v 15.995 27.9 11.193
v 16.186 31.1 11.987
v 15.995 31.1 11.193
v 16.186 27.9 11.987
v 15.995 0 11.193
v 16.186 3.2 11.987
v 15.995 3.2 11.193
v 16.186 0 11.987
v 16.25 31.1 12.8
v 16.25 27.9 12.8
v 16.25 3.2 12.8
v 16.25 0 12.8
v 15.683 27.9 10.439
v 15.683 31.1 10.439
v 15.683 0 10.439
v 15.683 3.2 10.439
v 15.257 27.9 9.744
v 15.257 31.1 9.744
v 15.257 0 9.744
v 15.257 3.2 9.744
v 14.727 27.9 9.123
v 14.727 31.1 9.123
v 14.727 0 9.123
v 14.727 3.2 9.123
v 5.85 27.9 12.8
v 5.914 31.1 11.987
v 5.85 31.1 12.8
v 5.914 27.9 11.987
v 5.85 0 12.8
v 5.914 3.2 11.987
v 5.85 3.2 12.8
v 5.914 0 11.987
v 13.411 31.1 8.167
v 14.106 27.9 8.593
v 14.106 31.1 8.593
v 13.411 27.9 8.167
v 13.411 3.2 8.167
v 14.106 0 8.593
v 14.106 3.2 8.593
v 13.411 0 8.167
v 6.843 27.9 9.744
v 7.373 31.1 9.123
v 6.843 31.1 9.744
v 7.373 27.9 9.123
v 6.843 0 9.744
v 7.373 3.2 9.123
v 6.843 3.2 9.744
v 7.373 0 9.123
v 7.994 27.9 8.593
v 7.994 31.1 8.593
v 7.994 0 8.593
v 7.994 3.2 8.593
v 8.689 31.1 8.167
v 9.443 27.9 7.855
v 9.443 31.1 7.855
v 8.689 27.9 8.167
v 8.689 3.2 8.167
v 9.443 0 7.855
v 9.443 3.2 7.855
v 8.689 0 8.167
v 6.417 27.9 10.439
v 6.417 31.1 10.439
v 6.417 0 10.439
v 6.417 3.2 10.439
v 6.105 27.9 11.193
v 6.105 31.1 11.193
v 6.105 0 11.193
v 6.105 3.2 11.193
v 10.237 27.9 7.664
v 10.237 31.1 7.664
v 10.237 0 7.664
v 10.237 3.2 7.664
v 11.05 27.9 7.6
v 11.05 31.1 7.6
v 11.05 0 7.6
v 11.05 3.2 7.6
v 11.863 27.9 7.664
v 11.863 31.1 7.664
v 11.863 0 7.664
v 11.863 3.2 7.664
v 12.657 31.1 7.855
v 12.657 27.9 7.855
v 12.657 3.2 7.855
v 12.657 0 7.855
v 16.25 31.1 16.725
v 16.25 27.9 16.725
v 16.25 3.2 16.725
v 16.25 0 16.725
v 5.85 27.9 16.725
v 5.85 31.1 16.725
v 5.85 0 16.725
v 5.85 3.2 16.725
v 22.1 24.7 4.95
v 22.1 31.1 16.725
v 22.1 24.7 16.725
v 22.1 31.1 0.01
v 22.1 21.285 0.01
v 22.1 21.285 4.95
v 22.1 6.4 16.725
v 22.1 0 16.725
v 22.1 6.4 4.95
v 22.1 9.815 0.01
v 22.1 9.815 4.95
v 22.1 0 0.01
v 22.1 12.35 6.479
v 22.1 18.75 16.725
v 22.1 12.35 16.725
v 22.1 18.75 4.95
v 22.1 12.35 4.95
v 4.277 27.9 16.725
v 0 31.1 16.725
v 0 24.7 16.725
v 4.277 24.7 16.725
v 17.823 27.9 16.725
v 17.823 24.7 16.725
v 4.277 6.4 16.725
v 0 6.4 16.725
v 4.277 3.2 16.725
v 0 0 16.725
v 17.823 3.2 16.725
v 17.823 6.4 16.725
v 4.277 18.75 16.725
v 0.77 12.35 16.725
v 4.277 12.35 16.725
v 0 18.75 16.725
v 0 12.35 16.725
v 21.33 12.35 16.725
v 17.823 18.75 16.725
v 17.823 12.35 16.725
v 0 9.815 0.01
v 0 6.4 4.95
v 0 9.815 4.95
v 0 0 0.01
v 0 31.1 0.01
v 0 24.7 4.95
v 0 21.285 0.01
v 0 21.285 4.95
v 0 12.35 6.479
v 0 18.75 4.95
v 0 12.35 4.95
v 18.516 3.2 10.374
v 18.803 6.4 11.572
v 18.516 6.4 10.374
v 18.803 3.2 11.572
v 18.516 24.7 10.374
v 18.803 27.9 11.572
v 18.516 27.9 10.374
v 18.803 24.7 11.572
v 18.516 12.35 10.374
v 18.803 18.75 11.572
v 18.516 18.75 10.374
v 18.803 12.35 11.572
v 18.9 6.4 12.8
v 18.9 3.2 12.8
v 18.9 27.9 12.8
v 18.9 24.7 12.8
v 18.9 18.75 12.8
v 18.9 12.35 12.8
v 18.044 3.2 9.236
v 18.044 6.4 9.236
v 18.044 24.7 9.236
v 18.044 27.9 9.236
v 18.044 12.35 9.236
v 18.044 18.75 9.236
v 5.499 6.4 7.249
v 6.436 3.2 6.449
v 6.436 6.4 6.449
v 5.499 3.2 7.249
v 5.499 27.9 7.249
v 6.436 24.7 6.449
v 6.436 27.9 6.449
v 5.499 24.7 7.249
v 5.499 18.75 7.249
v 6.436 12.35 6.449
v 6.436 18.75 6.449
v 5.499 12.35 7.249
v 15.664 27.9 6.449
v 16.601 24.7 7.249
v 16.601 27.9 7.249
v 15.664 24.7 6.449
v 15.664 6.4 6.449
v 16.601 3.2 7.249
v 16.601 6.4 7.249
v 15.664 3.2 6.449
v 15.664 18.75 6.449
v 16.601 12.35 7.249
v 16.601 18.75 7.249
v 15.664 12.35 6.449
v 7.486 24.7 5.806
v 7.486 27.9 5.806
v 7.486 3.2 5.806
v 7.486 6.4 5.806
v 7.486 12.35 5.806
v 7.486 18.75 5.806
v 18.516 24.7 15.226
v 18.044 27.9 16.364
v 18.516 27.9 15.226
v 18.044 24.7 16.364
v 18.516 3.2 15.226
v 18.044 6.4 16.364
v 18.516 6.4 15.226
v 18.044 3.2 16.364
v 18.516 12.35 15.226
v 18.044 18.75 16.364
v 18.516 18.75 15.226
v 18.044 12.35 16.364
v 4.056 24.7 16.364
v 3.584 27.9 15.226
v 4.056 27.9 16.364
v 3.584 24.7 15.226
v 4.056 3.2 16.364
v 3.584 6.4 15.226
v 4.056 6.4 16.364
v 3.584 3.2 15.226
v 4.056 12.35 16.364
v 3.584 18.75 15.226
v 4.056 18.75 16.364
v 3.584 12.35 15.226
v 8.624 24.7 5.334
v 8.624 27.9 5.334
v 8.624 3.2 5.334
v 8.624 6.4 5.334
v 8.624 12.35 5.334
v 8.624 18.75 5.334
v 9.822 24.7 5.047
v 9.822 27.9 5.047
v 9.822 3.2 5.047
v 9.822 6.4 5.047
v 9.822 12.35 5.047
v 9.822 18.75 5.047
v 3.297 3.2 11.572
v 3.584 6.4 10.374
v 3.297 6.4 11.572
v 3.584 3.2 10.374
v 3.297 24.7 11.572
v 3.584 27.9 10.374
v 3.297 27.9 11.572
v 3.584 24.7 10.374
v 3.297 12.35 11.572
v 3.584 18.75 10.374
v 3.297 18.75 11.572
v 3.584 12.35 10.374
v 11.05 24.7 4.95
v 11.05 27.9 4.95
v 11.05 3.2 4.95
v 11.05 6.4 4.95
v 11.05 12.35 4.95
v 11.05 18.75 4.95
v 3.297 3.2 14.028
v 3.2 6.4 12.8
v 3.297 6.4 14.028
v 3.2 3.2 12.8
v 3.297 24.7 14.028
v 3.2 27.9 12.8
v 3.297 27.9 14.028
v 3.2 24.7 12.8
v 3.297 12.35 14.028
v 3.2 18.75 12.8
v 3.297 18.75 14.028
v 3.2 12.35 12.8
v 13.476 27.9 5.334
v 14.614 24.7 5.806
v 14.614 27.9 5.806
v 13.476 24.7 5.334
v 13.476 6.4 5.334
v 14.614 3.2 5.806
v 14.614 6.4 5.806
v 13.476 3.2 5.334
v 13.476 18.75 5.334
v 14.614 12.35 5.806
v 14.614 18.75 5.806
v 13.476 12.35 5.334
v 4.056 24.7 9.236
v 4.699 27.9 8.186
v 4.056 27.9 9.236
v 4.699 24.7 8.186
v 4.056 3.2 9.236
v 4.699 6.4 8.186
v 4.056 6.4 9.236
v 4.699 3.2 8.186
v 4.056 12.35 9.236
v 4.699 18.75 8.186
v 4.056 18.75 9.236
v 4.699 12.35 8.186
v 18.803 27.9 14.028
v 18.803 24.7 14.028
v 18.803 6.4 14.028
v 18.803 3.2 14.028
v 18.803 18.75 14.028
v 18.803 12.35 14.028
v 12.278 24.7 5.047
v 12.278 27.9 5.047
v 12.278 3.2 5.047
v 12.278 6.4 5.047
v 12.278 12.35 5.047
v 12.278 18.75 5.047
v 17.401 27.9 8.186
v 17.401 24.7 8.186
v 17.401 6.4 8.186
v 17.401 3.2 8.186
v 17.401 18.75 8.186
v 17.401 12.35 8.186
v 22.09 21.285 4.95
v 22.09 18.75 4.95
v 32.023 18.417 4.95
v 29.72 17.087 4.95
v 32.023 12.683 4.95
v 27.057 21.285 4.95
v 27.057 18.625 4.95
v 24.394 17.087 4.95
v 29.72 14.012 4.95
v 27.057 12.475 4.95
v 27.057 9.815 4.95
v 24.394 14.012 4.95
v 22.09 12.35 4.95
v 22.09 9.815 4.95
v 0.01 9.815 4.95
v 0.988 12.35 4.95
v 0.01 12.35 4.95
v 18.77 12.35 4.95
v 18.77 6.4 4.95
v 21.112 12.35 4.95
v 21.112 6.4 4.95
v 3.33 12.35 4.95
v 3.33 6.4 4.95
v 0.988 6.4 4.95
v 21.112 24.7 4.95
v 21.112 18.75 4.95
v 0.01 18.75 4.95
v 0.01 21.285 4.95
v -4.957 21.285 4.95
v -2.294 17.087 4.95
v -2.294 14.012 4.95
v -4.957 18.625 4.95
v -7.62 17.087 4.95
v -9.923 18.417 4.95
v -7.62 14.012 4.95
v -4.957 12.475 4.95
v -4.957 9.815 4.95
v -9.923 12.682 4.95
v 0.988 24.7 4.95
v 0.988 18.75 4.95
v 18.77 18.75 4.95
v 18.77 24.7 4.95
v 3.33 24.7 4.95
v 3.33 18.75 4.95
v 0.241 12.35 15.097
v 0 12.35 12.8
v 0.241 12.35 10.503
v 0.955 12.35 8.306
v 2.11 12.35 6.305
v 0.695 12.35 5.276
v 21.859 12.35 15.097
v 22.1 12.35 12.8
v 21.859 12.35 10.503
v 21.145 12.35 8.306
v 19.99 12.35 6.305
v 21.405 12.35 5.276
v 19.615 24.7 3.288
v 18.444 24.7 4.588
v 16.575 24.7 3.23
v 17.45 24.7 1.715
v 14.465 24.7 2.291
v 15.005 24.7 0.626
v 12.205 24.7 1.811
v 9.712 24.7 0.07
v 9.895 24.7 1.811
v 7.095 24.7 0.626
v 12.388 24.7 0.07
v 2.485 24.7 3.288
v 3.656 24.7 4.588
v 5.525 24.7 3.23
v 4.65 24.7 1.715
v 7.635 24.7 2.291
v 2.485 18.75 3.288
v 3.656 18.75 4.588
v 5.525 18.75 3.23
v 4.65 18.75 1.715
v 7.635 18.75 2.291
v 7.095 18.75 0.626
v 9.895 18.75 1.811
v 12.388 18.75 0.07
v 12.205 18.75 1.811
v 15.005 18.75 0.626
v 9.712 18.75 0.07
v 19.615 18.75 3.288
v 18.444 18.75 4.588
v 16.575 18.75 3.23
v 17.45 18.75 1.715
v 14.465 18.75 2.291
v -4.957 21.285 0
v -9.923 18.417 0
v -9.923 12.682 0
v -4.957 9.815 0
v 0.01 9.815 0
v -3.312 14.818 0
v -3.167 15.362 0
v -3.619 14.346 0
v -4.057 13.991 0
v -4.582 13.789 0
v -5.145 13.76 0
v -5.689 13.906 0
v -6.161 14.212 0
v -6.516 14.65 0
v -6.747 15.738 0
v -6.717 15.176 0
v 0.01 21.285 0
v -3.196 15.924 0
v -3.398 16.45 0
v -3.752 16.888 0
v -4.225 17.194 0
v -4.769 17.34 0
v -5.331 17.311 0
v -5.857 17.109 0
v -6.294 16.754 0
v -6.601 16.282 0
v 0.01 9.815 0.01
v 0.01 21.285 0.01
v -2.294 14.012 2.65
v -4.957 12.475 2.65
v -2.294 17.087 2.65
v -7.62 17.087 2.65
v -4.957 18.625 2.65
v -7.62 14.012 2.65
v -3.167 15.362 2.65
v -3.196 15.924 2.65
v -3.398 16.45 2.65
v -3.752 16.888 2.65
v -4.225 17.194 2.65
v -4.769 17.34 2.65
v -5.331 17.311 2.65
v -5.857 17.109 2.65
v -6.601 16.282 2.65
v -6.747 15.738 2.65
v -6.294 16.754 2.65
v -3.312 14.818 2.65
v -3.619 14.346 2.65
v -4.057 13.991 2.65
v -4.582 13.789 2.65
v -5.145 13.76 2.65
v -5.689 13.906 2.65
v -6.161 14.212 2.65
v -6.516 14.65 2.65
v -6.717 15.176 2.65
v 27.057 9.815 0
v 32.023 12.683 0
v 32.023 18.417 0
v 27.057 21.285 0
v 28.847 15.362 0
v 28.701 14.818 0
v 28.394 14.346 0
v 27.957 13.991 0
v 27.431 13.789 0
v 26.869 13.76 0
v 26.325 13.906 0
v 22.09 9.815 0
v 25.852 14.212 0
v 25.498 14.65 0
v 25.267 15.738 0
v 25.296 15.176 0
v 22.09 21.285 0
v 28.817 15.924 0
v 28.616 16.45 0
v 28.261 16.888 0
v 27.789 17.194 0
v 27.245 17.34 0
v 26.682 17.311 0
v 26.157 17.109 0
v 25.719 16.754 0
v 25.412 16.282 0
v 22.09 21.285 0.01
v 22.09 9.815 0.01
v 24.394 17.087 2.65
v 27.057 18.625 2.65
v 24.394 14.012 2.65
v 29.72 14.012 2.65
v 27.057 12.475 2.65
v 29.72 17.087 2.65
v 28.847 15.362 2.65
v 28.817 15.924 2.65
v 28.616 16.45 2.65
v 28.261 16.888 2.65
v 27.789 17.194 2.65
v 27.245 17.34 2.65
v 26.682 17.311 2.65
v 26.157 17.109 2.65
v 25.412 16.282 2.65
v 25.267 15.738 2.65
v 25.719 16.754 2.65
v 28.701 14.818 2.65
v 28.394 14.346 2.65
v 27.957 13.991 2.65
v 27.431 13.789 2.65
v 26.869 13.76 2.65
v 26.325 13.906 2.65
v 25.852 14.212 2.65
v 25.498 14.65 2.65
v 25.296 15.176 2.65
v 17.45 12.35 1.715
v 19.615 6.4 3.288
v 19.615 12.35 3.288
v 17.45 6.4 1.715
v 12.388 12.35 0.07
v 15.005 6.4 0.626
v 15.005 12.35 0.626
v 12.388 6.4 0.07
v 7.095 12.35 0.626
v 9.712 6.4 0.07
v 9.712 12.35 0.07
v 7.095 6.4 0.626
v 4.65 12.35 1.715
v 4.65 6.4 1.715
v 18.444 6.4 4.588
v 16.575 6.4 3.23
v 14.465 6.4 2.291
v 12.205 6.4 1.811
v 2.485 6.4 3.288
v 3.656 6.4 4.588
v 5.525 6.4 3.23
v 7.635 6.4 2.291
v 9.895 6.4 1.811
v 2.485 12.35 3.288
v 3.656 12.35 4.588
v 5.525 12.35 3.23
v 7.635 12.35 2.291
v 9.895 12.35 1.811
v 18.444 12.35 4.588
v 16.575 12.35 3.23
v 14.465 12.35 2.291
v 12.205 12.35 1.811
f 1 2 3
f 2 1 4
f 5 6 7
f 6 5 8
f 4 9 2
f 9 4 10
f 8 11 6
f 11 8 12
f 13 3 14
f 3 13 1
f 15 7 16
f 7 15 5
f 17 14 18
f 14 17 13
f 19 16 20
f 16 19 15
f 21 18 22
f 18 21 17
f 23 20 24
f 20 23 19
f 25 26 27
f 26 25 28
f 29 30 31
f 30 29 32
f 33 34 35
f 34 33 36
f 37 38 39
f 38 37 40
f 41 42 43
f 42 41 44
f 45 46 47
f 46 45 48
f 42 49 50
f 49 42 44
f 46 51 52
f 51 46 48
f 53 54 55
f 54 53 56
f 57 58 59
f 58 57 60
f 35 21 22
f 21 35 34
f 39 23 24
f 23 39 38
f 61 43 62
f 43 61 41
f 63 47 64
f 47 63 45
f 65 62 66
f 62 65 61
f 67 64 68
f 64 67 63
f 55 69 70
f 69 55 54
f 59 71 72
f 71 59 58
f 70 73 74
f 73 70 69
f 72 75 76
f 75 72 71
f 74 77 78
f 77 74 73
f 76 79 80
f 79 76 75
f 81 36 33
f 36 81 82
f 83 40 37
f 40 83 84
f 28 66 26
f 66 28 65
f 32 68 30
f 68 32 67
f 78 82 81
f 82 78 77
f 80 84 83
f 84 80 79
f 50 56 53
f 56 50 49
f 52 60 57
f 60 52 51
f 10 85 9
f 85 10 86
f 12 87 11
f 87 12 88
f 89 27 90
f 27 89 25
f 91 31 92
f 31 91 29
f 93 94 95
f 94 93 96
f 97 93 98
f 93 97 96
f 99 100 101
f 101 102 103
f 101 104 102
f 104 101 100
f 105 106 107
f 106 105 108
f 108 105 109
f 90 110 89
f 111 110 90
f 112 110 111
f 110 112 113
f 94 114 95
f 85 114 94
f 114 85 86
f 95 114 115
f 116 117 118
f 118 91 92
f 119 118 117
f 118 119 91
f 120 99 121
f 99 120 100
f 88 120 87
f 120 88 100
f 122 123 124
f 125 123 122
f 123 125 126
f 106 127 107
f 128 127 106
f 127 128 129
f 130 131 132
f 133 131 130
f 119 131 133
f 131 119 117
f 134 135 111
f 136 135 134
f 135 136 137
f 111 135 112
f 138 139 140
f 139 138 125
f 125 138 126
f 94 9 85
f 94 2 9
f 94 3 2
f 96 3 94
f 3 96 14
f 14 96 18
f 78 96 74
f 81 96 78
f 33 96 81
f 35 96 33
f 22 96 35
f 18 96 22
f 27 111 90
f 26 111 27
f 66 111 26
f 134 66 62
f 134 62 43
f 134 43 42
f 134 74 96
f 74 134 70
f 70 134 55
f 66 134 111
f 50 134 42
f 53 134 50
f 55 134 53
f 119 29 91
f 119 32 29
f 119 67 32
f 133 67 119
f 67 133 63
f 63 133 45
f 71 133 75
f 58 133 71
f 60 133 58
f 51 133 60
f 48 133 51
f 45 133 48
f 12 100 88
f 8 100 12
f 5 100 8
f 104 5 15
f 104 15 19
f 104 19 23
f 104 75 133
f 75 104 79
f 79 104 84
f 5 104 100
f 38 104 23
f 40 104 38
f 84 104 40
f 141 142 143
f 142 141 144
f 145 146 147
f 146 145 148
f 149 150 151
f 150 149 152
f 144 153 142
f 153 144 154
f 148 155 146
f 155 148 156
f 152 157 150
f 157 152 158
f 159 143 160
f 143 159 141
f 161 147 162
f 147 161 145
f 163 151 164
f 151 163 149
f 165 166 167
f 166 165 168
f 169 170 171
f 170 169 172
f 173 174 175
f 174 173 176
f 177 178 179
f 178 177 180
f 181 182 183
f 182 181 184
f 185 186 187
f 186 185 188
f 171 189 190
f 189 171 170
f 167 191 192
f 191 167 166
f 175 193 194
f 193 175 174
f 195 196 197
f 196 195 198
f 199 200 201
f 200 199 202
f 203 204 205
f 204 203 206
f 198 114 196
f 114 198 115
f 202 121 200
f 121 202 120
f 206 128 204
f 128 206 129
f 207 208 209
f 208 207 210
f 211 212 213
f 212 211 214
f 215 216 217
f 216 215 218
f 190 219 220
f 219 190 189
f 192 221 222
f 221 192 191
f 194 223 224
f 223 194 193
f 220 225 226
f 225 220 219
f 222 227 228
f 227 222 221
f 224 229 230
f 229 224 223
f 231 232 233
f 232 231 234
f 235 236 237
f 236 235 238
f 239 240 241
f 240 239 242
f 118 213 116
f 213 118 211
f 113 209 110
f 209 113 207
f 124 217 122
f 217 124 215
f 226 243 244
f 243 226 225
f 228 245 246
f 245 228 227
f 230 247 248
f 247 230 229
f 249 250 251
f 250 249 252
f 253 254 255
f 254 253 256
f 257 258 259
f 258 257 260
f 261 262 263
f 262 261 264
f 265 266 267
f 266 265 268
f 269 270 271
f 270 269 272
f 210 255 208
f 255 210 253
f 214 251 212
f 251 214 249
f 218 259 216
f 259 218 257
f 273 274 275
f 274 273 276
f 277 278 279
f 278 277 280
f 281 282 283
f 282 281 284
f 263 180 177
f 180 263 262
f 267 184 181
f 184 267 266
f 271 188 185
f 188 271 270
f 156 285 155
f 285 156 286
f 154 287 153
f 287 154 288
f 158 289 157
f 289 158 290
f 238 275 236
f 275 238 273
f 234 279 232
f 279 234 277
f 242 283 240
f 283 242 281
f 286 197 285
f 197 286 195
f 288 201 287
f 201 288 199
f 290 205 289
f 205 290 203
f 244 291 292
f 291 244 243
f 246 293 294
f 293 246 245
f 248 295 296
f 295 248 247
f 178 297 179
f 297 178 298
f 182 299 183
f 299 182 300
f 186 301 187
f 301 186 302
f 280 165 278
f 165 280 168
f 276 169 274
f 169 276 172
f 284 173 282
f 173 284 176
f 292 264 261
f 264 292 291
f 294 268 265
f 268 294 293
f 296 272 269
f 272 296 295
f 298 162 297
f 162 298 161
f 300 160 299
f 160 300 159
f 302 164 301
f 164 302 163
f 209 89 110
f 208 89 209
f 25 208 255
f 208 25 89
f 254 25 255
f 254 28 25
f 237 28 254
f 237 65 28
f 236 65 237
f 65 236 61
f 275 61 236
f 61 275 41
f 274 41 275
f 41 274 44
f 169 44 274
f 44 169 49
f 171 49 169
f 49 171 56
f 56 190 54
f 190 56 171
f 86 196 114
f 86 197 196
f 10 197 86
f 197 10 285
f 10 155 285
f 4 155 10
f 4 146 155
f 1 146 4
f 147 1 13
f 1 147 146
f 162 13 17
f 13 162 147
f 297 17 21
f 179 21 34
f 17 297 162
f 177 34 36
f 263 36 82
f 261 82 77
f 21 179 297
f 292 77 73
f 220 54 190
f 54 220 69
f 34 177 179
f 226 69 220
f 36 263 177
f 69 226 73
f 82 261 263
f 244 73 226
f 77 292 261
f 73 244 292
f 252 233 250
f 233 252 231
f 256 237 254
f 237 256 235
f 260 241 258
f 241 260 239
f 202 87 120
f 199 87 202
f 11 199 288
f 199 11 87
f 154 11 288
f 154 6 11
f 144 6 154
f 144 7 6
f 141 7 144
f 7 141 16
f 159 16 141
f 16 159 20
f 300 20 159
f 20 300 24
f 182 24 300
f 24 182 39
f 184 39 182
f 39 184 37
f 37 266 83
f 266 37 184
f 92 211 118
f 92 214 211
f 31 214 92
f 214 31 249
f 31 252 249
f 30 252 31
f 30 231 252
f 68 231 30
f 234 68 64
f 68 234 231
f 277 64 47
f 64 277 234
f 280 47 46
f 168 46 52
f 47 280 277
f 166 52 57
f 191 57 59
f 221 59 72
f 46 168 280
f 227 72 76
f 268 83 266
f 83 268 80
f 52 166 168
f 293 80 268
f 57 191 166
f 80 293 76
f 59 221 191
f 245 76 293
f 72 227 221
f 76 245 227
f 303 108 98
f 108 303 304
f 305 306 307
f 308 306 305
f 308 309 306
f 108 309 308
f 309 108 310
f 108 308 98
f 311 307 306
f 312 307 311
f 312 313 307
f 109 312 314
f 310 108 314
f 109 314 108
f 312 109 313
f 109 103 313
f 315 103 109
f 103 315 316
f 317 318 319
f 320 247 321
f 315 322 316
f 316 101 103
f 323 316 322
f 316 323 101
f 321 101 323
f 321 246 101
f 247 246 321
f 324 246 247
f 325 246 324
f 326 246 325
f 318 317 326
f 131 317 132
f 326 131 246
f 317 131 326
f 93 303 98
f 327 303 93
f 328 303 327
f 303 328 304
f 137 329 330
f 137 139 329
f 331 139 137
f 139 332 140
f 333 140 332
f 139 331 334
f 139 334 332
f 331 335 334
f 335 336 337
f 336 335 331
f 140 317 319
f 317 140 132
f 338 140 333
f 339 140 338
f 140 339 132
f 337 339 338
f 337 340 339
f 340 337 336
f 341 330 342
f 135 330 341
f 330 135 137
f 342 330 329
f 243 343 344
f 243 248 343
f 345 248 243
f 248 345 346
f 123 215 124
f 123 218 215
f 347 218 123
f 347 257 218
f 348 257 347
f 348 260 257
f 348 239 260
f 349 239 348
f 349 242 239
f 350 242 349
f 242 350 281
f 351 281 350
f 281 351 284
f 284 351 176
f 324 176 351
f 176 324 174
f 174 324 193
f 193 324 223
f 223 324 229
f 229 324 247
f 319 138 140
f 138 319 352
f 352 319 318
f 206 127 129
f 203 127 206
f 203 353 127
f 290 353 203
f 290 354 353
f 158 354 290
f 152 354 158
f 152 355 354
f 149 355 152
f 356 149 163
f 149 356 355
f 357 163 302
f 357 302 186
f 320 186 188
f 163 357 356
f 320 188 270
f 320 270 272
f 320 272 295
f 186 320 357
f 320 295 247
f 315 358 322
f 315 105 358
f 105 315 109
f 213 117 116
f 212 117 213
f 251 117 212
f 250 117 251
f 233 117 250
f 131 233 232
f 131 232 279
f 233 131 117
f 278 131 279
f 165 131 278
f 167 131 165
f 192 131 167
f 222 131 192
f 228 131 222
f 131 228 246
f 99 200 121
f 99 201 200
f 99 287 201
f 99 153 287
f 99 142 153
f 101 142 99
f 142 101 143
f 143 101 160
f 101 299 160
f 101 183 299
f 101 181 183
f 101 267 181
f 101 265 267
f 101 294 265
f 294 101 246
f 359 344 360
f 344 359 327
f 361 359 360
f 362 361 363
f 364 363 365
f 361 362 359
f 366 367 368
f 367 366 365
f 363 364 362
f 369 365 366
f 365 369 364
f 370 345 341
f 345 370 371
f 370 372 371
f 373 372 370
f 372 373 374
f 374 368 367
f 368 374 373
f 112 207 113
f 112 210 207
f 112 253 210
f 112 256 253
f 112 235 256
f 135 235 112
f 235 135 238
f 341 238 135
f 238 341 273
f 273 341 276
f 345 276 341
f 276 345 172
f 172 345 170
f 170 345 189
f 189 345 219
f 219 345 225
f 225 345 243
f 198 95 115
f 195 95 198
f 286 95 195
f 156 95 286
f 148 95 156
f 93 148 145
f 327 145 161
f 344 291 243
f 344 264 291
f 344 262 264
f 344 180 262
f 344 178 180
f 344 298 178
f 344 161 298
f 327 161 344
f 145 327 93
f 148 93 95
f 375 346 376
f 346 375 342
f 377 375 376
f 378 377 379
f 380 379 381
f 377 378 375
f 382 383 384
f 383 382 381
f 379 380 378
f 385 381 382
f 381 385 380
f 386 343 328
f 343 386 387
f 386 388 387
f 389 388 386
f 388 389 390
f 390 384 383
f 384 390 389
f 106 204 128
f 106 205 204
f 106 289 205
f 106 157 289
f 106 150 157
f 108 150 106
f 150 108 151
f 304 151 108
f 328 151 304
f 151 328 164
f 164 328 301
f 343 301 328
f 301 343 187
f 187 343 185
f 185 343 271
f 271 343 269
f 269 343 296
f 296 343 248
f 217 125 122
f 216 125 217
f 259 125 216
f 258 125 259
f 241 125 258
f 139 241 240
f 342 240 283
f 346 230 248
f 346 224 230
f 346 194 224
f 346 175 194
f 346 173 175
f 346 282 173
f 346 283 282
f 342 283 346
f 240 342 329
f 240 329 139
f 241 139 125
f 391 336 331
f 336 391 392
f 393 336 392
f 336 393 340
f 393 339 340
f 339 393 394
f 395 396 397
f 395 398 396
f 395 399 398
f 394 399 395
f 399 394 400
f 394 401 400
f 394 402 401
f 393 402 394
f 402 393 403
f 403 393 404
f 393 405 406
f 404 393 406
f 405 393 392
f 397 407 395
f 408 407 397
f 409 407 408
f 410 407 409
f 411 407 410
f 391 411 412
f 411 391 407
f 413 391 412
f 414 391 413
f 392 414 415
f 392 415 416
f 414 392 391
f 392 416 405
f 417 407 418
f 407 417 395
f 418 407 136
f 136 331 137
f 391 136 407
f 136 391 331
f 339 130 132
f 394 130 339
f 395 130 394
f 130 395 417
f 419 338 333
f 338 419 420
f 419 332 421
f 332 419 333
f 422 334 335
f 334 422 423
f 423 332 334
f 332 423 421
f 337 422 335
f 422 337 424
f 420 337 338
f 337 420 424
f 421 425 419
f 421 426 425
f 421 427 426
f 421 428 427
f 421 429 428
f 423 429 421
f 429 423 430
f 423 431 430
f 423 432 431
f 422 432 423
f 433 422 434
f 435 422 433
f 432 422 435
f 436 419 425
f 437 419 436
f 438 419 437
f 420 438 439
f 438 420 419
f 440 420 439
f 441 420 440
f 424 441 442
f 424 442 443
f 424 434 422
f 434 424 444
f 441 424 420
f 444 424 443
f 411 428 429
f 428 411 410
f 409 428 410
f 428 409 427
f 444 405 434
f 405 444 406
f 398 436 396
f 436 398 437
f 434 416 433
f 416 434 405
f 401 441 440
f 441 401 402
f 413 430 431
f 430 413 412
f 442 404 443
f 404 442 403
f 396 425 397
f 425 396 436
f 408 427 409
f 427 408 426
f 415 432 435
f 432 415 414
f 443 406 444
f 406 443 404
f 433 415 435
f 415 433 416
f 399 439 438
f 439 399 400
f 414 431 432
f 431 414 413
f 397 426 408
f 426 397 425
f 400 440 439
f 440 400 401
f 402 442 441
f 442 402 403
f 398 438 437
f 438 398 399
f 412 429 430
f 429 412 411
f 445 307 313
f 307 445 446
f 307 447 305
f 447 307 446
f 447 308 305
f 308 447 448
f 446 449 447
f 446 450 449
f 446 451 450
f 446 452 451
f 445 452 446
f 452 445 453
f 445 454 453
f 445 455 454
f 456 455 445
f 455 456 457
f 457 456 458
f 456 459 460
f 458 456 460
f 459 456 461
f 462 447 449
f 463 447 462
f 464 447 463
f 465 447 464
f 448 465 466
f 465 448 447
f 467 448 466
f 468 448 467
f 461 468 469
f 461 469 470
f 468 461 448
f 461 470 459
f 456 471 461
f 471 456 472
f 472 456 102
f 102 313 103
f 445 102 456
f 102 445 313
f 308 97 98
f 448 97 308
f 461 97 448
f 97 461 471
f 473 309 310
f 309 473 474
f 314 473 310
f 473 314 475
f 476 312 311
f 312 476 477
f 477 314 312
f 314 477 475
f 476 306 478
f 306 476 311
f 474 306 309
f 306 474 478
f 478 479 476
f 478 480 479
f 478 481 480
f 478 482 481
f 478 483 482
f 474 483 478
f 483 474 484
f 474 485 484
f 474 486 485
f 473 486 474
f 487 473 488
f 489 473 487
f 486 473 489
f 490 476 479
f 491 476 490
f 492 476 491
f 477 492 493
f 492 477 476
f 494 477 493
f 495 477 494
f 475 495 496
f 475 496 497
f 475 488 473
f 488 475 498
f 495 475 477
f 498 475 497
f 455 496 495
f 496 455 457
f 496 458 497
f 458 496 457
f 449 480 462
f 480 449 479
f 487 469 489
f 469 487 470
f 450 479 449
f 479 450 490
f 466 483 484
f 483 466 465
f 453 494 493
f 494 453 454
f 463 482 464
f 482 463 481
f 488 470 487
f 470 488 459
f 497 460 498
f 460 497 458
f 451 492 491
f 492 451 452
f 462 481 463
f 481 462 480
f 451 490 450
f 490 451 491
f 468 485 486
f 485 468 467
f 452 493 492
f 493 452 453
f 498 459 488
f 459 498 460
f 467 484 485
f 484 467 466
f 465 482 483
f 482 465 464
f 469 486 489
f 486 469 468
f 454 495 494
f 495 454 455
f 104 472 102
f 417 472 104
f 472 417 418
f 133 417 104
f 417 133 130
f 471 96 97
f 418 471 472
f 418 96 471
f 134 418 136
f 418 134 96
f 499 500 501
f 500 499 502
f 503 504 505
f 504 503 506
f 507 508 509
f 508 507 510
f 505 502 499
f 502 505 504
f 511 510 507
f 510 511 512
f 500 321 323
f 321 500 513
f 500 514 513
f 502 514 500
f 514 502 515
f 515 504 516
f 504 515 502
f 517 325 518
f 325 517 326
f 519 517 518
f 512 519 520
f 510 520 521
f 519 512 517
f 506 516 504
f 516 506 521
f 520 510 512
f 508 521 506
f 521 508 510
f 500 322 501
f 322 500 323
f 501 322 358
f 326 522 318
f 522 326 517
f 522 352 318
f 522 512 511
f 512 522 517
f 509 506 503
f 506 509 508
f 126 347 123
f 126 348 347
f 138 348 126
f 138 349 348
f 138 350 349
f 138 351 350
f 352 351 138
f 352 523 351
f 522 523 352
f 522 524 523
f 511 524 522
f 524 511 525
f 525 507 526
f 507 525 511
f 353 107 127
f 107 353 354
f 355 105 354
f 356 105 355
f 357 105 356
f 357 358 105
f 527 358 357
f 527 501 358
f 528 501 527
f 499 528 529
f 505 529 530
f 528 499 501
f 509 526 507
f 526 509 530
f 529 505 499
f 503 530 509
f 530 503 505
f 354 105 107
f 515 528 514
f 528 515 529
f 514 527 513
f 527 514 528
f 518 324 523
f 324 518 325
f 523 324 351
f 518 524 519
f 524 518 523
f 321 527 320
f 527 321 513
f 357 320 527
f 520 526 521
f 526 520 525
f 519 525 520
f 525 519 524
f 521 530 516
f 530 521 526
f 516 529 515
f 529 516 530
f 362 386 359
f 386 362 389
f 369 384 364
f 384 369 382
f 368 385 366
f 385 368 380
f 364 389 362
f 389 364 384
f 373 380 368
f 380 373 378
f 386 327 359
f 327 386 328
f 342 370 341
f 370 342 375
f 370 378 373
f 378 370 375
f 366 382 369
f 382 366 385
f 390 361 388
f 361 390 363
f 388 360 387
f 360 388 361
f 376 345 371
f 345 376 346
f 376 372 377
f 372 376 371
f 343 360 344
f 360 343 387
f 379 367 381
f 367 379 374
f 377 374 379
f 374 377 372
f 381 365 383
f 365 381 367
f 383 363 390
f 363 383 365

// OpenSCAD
// file: functions.scad
// PRUSA Mendel  
// Functions used in many files
// GNU GPL v2
// Josef Průša
// josefprusa@me.com
// prusadjs.cz
// http://www.reprap.org/wiki/Prusa_Mendel
// http://github.com/prusajr/PrusaMendel

module nut(d,h,horizontal=true){
cornerdiameter =  (d / 2) / cos (180 / 6);
cylinder(h = h, r = cornerdiameter, $fn = 6);
if(horizontal){
for(i = [1:6]){
	rotate([0,0,60*i]) translate([-cornerdiameter-0.2,0,0]) rotate([0,0,-45]) cube(size = [2,2,h]);
}}
}

// By nophead
module polyhole(d,h) {
    n = max(round(2 * d),3);
    rotate([0,0,180])
        cylinder(h = h, r = (d / 2) / cos (180 / n), $fn = n);
}




module roundcorner(diameter){
	difference(){
		cube(size = [diameter,diameter,99], center = false);
		translate(v = [diameter, diameter, 0]) cylinder(h = 100, r=diameter, center=true);
	}
}
// file: metric.scad
// PRUSA Mendel  
// Default metric sizes
// GNU GPL v2
// Josef Průša
// josefprusa@me.com
// prusadjs.cz
// http://www.reprap.org/wiki/Prusa_Mendel
// http://github.com/prusajr/PrusaMendel

// DONT CHANGE THIS FILE! ALTER VALUES IN CONFIGURATION.SCAD INSTEAD

// RODS

threaded_rod_diameter = 8.2;
threaded_rod_diameter_horizontal = 8.2;
smooth_bar_diameter = 8;
smooth_bar_diameter_horizontal = 8.5;

// Nuts and bolts

m8_diameter = 8.9;
m8_nut_diameter = 15.1;

m4_diameter = 4.5;
m4_nut_diameter = 9;

m3_diameter = 3.6;
m3_nut_diameter = 6.15;
m3_nut_heigth = 2.3;
m3_nut_wallDist = cos(30)*m3_nut_diameter;
m3_nut_diameter_horizontal = 6.1;

// Bushing holder

bushing_core_diameter = smooth_bar_diameter;
bushing_material_thickness = 1;

// Motors

motor_shaft = 5.5;
// file: configuration.scad
// PRUSA Mendel  
// Configuration file
// GNU GPL v2
// Josef Průša
// josefprusa@me.com
// prusadjs.cz
// http://www.reprap.org/wiki/Prusa_Mendel
// http://github.com/prusajr/PrusaMendel

// PLEASE SELECT ONE OF THE CONFIGURATIONS BELOW
// BY UN-COMMENTING IT

// Uncomment for metric settings
// METRIC METRIC METRIC METRIC METRIC METRIC METRIC METRIC 

include <metric.scad>;

// Uncomment for imperial settings
// IMPERIAL IMPERIAL IMPERIAL IMPERIAL IMPERIAL IMPERIAL IMPERIAL 

//include <sae.scad>;

// CUSTOM CUSTOM CUSTOM CUSTOM CUSTOM CUSTOM CUSTOM CUSTOM CUSTOM

thin_wall = 3;

// LM8UU
linear = false;


// CHANGE ONLY THE STUFF YOU KNOW
// IT WILL REPLACE DEFAULT SETTING

// RODS

// threaded_rod_diameter = 0;
// threaded_rod_diameter_horizontal = 0;
// smooth_bar_díameter = 0;
// smooth_bar_díameter_horizontal = 0;

// Nuts and bolts

// m8_diameter = 0;
// m8_nut_diameter = 0;

// m4_diameter = 0;
// m4_nut_diameter = 0;

// m3_diameter = 0;
// m3_nut_diameter = 0;

// Bushing holder

// bushing_core_diameter = smooth_bar_díameter;
// bushing_material_thickness = 0;


///counted stuff
m3_nut_diameter_bigger = ((m3_nut_diameter  / 2) / cos (180 / 6))*2;

// functions 
include <functions.scad>
// file: gregs-lm8uu-holder.scad
// Gregs PRUSA Mendel  
// X-carriage
// Used for sliding on X axis
// GNU GPL v2
// Greg Frost
//https://github.com/GregFrost/PrusaMendel

include <configuration.scad>

clearance=0.7;

lm8uu_diameter=15+clearance;
lm8uu_length=24+clearance;
lm8uu_support_thickness=3.2; 
lm8uu_end_diameter=m8_diameter+1.5;

lm8uu_holder_width=lm8uu_diameter+2*lm8uu_support_thickness;
lm8uu_holder_length=lm8uu_length+2*lm8uu_support_thickness;
lm8uu_holder_height=lm8uu_diameter*0.75+lm8uu_support_thickness;
lm8uu_holder_gap=(lm8uu_holder_length-6*lm8uu_support_thickness)/2;

module lm8uu_bearing_holder()
{
	difference()
	{
		cube([lm8uu_holder_width,lm8uu_holder_length,lm8uu_holder_height]);
		translate([lm8uu_holder_width/2,0,lm8uu_holder_width/2])
		rotate([-90,0,0])
		translate([0,0,lm8uu_support_thickness])
		cylinder(r=lm8uu_diameter/2,h=lm8uu_length,$fn=40);

		translate([lm8uu_holder_width/2,0,lm8uu_holder_width/2])
		rotate([-90,0,0])
		translate([0,0,-1])
		{
			cylinder(r=lm8uu_end_diameter/2,h=lm8uu_holder_length+2,$fn=40);
			translate([-lm8uu_end_diameter/2,-lm8uu_end_diameter,0])
			cube([lm8uu_end_diameter,lm8uu_end_diameter,lm8uu_holder_length+2]);
		}

		translate([-1,2*lm8uu_support_thickness,lm8uu_support_thickness])
		cube([lm8uu_holder_width+2,lm8uu_holder_gap,
			lm8uu_holder_height-lm8uu_support_thickness+1]);

		translate([-1,4*lm8uu_support_thickness+lm8uu_holder_gap,
			lm8uu_support_thickness])
		cube([lm8uu_holder_width+2,lm8uu_holder_gap,
			lm8uu_holder_height-lm8uu_support_thickness+1]);
	}
}
// main file
// Gregs PRUSA Mendel  
// X-carriage
// Used for sliding on X axis
// GNU GPL v2
// Greg Frost
//https://github.com/GregFrost/PrusaMendel

include <gregs-lm8uu-holder.scad>
include <configuration.scad>

OS = 0.01;

cabelTie_height = 1.75;
minDist = 0.5;
genWallThicknes = 1.33;

//m3_nut_diameter

y_axis_holder ();

// ring with inner radius r and w as witth and h as heigt
module ring(r,w,h,center=false){
	difference() {
		union () {
			cylinder(r=r+w,h=h, center=center);
		}
		union () {
			translate([0, 0, -OS]) 
			cylinder(r=r,h=h+2*OS, center=center);
		}
	}
}

module nutFall() {
	translate([-cos(30)*(m3_nut_diameter/2+genWallThicknes*2), 0, 0])  rotate(a=30,v=[0,0,1]) 
	difference() {
		union(){
			cylinder(r=m3_nut_diameter/2+genWallThicknes*2, h=cabelTie_height+lm8uu_support_thickness, center=false,$fn=6);
			rotate(a=-30,v=[0,0,1]) translate([0, -(m3_nut_diameter/2+genWallThicknes*2), 0])
			cube(size=[cos(30)*(m3_nut_diameter/2+genWallThicknes*2),(m3_nut_diameter/2+genWallThicknes*2)*2, cabelTie_height+lm8uu_support_thickness], center=false);
		}

		//nutfall
		translate([0, 0, cabelTie_height+lm8uu_support_thickness-m3_nut_heigth]) 
		cylinder(r=m3_nut_diameter/2, h=m3_nut_heigth+OS, center=false,$fn=6);
		translate([0, 0, -OS]) 
		cylinder(r=m3_diameter/2, h=cabelTie_height+lm8uu_support_thickness+2*OS, center=false,$fn=20);
	}
}
//nutFall();

module y_axis_holder()
{
	difference() {
		union(){
			translate([0, 0, cabelTie_height]) 
			lm8uu_bearing_holder();

			//screwPlate
			translate([0, 0, +OS]) 
			cube(size=[lm8uu_holder_width, lm8uu_holder_length, cabelTie_height], center=false);
			translate([OS, lm8uu_holder_length/2, 0]) 
			nutFall();

			translate([lm8uu_holder_width-OS, lm8uu_holder_length/2, 0]) rotate(a=180,v=[0,0,1]) 
			nutFall();
			
		}
		union(){
			translate([lm8uu_holder_width/2, 2*lm8uu_support_thickness, lm8uu_holder_width/2 +cabelTie_height])
			rotate(a=-90,v=[1,0,0]) 
			 	ring(r=lm8uu_holder_width/2,w=cabelTie_height,h=lm8uu_holder_gap);

			translate([lm8uu_holder_width/2, 4*lm8uu_support_thickness+lm8uu_holder_gap, lm8uu_holder_width/2 +cabelTie_height])
			rotate(a=-90,v=[1,0,0]) 
			 	ring(r=lm8uu_holder_width/2,w=cabelTie_height,h=lm8uu_holder_gap);
			
		}
	}
	

}
